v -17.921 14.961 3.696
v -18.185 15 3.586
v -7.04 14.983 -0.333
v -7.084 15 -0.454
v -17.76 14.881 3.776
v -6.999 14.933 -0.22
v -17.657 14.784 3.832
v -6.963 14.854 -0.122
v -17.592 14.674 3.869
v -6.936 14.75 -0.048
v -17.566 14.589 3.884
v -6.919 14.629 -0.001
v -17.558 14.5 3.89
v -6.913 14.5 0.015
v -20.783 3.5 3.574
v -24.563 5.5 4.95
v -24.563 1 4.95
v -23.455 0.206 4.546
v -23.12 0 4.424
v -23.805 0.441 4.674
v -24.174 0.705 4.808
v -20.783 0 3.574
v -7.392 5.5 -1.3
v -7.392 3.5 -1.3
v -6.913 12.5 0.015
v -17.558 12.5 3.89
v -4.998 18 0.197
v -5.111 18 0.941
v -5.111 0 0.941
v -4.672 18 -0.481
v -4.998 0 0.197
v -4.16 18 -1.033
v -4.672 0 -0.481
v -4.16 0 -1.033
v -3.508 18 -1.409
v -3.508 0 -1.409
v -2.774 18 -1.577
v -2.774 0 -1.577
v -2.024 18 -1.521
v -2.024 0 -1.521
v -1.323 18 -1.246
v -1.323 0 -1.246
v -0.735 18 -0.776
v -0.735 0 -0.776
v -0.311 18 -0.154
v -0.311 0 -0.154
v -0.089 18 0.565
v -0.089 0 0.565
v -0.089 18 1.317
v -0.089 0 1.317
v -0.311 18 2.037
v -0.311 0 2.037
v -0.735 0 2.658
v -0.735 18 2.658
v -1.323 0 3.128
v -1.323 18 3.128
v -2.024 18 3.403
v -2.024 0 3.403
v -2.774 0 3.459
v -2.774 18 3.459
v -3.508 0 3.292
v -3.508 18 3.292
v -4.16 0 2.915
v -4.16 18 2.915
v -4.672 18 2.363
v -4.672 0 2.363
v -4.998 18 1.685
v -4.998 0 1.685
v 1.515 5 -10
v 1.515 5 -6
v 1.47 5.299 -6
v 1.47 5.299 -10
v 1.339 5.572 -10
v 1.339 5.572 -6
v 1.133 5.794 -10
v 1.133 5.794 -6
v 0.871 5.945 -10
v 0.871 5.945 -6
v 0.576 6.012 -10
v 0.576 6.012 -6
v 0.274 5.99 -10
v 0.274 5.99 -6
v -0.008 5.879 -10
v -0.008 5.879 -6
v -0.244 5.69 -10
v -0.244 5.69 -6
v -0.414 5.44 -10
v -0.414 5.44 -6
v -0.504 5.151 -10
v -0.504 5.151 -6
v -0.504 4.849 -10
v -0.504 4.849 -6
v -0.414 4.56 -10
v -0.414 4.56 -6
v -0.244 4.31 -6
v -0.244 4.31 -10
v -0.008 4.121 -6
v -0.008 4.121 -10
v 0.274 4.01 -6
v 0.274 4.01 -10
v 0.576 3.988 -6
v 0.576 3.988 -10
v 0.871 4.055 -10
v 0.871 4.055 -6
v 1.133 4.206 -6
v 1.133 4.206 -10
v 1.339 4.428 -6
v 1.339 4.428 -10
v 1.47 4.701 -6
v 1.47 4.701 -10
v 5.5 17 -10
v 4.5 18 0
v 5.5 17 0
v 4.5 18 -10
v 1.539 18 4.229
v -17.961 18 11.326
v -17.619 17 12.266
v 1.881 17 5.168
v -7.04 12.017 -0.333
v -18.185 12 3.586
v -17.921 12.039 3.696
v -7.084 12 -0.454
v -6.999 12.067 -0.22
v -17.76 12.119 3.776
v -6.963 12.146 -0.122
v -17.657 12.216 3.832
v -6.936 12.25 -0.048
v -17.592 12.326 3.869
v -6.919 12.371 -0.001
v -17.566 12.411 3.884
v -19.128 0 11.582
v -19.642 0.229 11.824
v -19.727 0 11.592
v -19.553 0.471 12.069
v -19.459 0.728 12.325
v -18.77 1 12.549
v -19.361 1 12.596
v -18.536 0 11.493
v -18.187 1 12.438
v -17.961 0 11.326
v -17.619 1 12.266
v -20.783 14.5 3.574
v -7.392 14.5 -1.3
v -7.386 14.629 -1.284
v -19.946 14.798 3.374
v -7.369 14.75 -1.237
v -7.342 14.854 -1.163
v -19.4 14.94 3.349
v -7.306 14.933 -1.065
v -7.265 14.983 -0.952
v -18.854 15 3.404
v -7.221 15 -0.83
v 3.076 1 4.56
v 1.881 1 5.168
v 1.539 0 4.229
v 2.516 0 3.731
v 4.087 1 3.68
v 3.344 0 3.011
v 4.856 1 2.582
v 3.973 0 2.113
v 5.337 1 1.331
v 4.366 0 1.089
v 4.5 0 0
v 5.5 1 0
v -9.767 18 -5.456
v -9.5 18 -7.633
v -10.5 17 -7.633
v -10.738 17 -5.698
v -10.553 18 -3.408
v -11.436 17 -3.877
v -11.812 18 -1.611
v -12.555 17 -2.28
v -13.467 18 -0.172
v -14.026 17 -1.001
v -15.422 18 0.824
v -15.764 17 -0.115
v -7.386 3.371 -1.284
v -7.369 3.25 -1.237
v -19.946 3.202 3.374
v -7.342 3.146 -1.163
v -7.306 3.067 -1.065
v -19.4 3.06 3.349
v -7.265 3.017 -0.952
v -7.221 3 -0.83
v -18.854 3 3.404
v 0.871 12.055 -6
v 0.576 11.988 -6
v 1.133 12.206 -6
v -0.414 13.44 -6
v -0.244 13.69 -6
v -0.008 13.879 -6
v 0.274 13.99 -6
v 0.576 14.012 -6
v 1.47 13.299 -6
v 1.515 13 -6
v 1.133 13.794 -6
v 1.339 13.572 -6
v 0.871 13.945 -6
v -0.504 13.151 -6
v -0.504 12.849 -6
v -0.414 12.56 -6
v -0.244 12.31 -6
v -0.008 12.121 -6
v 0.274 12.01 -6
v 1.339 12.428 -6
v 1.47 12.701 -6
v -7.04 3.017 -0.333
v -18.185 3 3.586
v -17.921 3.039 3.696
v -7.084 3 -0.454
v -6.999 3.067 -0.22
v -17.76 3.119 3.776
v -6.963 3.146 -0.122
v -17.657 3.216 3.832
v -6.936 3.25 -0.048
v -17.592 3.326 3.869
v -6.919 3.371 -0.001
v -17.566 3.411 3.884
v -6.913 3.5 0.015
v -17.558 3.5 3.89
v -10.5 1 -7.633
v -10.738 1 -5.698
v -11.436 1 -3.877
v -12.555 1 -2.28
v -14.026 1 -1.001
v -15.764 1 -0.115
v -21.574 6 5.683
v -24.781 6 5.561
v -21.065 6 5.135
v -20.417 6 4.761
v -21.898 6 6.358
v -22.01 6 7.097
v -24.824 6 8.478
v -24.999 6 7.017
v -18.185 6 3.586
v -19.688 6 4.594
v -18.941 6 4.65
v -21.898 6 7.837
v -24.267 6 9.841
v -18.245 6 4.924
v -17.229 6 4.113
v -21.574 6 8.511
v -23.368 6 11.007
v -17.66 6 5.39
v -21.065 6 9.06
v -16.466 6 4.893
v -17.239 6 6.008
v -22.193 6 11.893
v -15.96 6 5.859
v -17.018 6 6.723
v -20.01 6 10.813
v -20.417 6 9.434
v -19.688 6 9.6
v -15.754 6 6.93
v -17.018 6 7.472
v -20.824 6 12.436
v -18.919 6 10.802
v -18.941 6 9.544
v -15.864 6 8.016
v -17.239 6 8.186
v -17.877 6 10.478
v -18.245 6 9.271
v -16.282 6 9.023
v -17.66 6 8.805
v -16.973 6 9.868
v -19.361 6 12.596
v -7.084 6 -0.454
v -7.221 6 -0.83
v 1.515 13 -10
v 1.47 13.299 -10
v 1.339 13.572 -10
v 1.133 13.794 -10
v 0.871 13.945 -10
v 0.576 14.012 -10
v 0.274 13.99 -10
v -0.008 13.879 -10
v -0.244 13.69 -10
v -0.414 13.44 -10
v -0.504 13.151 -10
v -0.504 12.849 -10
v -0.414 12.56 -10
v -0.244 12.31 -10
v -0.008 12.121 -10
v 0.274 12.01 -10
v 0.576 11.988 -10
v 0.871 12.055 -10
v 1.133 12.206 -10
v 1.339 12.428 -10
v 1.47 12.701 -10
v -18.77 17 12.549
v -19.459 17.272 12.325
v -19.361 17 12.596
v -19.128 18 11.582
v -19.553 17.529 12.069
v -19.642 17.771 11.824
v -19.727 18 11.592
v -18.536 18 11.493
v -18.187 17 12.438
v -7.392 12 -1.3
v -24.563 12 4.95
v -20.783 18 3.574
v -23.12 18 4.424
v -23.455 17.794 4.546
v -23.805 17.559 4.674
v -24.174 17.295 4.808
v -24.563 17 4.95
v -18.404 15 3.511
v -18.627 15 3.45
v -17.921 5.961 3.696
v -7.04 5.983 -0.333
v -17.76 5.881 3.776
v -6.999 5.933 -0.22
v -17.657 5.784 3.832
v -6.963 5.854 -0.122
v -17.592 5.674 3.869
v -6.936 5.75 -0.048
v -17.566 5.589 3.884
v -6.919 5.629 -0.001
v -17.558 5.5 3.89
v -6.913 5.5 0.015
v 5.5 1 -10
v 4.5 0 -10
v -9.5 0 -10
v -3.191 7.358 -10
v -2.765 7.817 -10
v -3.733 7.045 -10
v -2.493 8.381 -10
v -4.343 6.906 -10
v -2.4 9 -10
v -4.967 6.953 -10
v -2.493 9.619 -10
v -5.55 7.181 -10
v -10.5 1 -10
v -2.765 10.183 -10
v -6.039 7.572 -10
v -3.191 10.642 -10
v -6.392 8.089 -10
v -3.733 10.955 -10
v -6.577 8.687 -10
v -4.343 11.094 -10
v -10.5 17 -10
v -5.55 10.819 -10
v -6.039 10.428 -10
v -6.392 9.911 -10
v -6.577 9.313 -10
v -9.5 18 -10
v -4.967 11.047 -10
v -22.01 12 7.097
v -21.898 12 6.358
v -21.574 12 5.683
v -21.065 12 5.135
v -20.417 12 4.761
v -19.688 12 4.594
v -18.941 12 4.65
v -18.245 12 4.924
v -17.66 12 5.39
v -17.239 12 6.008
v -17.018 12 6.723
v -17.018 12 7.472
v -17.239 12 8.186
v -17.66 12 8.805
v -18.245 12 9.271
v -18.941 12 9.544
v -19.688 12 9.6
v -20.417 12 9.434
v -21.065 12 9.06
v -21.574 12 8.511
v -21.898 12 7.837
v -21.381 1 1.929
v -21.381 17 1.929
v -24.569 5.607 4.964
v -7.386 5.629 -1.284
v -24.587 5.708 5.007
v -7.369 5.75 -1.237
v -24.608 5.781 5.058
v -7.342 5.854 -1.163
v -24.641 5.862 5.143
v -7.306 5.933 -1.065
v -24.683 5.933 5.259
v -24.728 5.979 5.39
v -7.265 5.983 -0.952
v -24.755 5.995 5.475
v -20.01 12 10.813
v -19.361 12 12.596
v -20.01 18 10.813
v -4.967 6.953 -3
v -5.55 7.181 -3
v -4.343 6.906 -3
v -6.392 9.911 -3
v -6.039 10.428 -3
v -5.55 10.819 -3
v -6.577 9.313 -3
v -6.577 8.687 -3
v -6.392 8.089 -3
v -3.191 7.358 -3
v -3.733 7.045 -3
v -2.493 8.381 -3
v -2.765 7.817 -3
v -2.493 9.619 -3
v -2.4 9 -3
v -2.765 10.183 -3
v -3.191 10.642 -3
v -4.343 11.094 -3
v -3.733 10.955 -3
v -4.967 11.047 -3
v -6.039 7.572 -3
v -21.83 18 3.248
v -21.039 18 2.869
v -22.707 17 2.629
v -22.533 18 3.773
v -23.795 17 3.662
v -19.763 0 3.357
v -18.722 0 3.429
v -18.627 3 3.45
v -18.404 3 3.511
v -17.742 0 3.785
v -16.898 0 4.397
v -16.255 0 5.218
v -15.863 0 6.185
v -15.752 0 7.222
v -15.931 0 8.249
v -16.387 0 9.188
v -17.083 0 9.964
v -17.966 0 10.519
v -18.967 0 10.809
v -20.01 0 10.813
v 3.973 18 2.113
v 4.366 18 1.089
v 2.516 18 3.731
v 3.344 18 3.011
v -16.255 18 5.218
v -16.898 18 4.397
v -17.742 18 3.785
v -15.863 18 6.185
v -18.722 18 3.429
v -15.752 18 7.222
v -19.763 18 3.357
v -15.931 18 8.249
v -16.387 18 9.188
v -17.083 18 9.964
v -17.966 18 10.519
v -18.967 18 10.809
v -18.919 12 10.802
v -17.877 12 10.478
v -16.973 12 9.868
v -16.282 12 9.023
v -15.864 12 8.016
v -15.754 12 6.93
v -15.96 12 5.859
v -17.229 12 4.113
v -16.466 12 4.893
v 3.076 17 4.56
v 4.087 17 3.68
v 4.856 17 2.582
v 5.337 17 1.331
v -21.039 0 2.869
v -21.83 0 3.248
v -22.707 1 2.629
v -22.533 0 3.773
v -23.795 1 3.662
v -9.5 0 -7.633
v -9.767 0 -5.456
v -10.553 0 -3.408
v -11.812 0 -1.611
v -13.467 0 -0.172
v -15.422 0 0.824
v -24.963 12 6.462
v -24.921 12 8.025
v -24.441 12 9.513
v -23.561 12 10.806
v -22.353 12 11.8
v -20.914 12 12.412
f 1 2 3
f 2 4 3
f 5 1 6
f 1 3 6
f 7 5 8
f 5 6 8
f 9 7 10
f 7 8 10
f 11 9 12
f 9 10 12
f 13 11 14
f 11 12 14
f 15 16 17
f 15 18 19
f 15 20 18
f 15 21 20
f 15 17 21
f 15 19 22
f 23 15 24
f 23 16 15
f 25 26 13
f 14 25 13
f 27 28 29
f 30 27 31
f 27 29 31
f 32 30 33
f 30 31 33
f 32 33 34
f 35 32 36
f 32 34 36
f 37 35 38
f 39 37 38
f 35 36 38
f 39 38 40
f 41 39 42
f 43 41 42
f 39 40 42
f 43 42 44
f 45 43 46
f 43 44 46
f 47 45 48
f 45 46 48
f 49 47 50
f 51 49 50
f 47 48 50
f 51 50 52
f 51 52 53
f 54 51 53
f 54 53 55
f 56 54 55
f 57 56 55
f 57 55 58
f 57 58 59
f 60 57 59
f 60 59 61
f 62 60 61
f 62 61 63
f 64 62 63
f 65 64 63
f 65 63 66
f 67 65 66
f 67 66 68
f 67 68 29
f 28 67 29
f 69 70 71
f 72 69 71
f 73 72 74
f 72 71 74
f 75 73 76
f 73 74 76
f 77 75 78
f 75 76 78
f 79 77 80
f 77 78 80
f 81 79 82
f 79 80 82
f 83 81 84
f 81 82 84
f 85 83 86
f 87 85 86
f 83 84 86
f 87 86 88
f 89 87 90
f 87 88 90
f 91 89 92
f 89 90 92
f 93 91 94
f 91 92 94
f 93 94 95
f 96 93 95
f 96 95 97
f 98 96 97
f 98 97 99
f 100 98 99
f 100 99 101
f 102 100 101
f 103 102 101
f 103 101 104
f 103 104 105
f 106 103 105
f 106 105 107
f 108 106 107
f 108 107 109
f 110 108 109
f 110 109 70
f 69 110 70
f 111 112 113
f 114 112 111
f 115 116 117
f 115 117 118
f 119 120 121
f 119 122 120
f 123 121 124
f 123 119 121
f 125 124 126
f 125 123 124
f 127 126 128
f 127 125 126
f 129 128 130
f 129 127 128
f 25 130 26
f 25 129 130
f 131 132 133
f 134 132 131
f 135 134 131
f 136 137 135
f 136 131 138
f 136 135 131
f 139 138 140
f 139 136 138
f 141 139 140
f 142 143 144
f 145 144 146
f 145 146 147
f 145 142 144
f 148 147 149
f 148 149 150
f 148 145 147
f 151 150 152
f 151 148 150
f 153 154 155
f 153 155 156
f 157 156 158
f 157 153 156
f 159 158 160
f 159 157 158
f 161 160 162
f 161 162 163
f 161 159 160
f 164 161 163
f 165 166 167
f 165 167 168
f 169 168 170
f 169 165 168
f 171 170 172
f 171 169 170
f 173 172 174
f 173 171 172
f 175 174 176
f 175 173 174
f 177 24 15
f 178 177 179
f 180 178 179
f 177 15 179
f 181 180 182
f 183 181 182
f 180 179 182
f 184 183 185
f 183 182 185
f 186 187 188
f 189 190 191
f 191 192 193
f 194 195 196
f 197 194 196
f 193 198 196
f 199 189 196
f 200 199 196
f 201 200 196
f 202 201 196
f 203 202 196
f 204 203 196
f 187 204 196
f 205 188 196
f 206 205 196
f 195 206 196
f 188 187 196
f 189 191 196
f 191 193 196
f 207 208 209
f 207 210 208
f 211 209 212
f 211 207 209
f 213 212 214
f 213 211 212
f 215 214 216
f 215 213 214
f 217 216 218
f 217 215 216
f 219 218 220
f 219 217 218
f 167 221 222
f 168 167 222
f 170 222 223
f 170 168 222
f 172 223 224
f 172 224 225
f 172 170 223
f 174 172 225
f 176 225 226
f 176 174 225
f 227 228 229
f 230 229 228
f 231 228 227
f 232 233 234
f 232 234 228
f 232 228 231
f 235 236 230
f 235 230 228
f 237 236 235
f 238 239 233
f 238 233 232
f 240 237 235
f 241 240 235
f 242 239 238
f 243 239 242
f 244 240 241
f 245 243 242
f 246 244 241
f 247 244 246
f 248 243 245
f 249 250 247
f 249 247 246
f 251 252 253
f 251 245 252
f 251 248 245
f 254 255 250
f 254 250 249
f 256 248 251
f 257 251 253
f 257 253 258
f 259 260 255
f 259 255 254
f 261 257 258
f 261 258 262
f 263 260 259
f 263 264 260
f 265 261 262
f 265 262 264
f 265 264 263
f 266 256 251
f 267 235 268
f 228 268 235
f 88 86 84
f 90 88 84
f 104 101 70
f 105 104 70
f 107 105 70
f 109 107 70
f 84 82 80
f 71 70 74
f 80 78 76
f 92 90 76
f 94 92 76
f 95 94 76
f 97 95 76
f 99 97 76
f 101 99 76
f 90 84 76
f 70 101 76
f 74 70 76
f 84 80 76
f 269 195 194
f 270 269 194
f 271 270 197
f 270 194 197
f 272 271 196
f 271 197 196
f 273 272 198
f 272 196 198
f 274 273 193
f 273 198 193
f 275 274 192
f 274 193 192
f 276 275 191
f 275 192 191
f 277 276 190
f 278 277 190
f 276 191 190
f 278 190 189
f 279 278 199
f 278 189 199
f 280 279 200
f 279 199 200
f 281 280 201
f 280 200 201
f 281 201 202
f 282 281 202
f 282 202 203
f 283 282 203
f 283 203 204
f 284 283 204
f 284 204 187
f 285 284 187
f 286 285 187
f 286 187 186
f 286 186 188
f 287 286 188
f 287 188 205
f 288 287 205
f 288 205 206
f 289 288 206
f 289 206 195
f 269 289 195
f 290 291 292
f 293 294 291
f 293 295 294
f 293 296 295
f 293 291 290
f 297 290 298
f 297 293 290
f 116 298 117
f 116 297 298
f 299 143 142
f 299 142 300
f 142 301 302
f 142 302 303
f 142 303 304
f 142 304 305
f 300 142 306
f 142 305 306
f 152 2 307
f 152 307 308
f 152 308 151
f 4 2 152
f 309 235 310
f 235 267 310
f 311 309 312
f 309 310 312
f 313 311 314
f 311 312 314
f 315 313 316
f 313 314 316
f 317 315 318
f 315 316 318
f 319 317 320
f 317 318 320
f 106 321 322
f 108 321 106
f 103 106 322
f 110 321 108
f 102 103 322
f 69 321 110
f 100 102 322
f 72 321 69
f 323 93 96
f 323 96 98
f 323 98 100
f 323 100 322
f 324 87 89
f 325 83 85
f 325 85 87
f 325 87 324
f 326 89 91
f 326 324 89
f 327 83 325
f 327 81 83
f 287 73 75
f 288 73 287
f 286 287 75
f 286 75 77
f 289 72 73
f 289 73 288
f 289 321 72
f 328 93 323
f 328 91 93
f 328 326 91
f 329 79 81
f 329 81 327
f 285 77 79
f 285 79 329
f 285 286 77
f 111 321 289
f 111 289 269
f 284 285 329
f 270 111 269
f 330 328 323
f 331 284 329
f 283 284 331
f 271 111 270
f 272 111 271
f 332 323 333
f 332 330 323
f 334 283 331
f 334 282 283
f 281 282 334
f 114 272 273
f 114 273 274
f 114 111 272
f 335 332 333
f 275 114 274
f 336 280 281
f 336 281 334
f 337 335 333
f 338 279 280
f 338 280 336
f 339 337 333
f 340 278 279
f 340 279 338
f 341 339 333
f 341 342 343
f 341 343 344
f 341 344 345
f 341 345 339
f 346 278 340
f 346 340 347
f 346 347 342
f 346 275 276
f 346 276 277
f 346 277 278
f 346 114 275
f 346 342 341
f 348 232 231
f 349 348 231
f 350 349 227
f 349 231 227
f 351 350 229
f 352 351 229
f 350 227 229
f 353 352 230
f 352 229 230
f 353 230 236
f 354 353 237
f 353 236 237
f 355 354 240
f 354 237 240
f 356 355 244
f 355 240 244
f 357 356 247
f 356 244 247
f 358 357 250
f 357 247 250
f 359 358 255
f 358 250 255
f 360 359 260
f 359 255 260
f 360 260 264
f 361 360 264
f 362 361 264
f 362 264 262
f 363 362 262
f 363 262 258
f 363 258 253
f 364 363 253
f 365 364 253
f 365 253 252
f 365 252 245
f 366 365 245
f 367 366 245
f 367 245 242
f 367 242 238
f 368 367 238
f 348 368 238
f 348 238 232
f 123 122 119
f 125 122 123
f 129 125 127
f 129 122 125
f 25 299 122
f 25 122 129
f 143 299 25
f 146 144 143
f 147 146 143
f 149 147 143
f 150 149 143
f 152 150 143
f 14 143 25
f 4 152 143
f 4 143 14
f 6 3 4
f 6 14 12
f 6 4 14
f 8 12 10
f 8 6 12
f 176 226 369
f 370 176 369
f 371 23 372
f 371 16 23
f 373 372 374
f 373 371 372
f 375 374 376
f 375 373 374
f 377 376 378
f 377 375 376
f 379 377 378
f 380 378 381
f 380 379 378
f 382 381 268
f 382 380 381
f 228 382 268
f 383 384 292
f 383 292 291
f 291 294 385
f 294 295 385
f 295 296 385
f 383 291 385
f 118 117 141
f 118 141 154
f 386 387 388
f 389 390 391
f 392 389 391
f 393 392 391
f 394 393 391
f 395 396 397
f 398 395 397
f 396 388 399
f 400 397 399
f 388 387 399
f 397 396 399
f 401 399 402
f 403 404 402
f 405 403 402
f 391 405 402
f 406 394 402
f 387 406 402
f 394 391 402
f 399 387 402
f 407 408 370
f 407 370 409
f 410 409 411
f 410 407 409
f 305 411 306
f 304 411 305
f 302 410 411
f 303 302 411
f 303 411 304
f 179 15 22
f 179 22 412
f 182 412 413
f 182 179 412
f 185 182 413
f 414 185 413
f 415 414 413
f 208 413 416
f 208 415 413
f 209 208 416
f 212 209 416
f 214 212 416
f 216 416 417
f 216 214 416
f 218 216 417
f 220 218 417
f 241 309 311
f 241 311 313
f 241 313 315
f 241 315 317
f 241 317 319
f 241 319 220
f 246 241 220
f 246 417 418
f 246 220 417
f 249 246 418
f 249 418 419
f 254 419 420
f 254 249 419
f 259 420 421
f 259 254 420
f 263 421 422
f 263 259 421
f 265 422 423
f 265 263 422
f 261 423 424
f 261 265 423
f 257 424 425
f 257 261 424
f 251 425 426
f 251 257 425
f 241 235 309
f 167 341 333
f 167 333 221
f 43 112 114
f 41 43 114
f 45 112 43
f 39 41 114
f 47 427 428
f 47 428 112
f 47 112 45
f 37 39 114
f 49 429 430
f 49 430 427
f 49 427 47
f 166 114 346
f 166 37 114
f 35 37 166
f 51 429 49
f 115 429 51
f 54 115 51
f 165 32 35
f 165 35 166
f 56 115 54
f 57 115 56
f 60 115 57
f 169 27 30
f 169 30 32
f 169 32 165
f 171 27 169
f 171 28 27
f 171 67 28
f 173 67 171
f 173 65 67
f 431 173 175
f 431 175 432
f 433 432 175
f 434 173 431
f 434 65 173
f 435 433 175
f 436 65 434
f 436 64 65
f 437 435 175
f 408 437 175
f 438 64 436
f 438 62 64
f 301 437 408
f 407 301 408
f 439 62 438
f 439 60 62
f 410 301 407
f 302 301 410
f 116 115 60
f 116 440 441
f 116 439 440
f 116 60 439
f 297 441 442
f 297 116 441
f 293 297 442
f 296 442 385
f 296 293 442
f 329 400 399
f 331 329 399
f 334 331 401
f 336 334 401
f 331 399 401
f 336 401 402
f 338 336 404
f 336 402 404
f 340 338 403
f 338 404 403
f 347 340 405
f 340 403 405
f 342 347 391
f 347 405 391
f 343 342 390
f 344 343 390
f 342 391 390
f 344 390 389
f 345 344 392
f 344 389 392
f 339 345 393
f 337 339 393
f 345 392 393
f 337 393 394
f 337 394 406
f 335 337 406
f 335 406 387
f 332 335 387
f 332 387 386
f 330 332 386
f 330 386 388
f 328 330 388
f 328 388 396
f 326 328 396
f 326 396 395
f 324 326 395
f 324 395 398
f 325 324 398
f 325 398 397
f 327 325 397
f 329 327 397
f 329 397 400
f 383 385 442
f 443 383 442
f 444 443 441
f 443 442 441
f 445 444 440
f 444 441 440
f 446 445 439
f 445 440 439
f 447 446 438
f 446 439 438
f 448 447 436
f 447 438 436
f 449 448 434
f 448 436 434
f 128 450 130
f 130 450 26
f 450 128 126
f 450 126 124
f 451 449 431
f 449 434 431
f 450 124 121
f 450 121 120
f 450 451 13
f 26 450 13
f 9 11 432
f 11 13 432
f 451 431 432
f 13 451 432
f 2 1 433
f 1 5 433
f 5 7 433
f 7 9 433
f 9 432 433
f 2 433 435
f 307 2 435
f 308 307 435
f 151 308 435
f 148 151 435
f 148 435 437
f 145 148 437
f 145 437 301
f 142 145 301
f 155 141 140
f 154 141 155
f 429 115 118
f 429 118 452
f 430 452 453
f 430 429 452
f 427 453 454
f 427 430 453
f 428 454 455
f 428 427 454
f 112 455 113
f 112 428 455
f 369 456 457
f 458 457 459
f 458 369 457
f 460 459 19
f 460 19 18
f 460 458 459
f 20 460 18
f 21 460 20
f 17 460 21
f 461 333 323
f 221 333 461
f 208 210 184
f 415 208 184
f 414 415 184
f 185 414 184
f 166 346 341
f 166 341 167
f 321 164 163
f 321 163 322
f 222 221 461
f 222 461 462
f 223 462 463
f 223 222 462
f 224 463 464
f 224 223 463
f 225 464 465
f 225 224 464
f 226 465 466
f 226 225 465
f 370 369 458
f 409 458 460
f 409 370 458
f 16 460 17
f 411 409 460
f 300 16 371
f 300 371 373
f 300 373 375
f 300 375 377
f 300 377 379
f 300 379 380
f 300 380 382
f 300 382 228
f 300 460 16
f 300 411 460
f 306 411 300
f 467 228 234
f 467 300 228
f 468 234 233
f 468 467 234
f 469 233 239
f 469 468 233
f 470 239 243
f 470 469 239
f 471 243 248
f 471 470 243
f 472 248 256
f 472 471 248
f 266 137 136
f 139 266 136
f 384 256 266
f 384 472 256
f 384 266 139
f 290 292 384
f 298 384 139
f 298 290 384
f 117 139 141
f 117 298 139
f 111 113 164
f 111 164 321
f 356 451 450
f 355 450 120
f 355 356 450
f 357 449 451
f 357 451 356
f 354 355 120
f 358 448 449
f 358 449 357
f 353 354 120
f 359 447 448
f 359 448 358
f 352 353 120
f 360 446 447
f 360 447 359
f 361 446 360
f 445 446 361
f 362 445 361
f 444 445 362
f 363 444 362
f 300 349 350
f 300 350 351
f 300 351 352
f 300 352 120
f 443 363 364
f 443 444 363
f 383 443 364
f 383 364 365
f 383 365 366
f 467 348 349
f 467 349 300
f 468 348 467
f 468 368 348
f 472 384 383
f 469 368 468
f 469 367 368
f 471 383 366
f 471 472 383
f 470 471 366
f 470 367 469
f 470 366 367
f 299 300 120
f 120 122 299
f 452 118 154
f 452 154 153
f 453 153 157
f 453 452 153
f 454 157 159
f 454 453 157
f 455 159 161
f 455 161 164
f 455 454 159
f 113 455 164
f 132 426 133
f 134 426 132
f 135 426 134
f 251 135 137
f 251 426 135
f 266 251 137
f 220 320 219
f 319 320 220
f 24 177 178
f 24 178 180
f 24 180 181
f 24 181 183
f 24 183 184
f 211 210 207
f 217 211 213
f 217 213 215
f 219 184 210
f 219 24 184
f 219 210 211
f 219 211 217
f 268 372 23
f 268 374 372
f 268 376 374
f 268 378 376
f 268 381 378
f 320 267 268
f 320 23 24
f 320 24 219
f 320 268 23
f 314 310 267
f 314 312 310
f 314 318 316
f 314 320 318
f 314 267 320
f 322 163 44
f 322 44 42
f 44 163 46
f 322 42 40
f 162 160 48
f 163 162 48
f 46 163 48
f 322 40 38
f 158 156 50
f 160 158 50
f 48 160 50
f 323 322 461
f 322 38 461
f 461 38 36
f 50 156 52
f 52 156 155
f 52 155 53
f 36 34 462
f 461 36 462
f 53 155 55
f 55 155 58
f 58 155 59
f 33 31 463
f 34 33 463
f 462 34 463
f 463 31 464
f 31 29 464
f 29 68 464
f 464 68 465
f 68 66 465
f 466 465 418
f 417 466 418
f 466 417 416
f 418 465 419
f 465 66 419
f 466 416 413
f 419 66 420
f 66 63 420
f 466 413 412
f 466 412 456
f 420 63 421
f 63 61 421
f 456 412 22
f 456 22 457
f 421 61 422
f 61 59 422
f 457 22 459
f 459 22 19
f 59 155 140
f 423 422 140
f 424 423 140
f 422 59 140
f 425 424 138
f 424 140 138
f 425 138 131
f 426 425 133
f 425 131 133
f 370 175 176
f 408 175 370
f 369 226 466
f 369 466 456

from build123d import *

# Parameters (mm, degrees)
EXTRUDE_1_DEPTH     = 14.999999999999998
CUT_EXTRUDE_1_DEPTH = 32.759958749611776
CUT_EXTRUDE_2_DEPTH = 5.999999999999998
CUT_EXTRUDE_START   = -2.9999999999999996
CUT_EXTRUDE_3_DEPTH = 2.9999999999999996
CUT_EXTRUDE_START_2 = -3.0000000000000004
CUT_EXTRUDE_4_DEPTH = 3.0000000000000004
CUT_EXTRUDE_5_DEPTH = 10.50007039461797
CUT_EXTRUDE_6_DEPTH = 11.327672160759418
EXTRUDE_2_DEPTH     = 7.968709711177614
EXTRUDE_3_DEPTH     = 3.000000000000002
HOLE_WIZARD_1_D     = 4.2
HOLE_WIZARD_1_DEPTH = 7
HOLE_WIZARD_2_D     = 2.03
HOLE_WIZARD_2_DEPTH = 4
HOLE_WIZARD_3_D     = 2.03
HOLE_WIZARD_3_DEPTH = 4
HOLE_WIZARD_4_D     = 5.05
HOLE_WIZARD_5_D     = 5.02
HOLE_WIZARD_5_DEPTH = 12
FILLET_1_R          = 5.500000000000002
FILLET_2_R          = 8
CHAMFER_1_SIZE      = 0.9999999999999993
FILLET_3_R          = 0.5


with BuildPart() as part:
    # 草图1 → 凸台-拉伸1 (new body)
    with BuildSketch(Plane(origin=(0, 18, 0), x_dir=(1, 0, 0), z_dir=(0, 1, 0))):
        with BuildLine():
            Line((-17.618889211708797, -12.26572898251346), (21.661848401793918, 2.0312902888225244))
            Line((21.661848401793918, 2.0312902888225244), (-10.5, 2.0312902888223876))
            Line((-10.5, 2.0312902888223876), (-21.381110788291235, -1.9291101538684705))
            ThreePointArc((-21.381110788291235, -1.9291101538684705), (-24.668309414322497, -8.978530356482176), (-17.618889211708797, -12.26572898251346))
        make_face()
    extrude(amount=-EXTRUDE_1_DEPTH)

    # 草图2 → 切除-拉伸1 (cut, through all)
    with BuildSketch(Plane(origin=(0, 18, 0), x_dir=(-1, 0, 0), z_dir=(0, 1, 0))):
        Polygon((-21.66184840179392, -2.0312902888223894), (-5.5000000000000036, -2.0312902888223876), (-5.500000000000005, 3.8511414601534057), align=None)
    extrude(amount=-CUT_EXTRUDE_1_DEPTH, mode=Mode.SUBTRACT)

    # 草图3 → 切除-拉伸2 (cut)
    with BuildSketch(Plane(origin=(0, 18, 0), x_dir=(-1, 0, 0), z_dir=(0, 1, 0))):
        with BuildLine():
            Line((20.78257553747125, 3.5735722402438013), (24.563305918164147, 4.949645562601932))
            ThreePointArc((24.563305918164147, 4.949645562601932), (24.047293898775088, 10.191303567012326), (19.3611131717343, 12.59566569299606))
            Line((19.3611131717343, 12.59566569299606), (20.01010960022055, 10.812562660423456))
            ThreePointArc((20.01010960022055, 10.812562660423456), (15.771169677152303, 6.6995195513380725), (20.78257553747125, 3.5735722402438013))
        make_face()
    extrude(amount=-CUT_EXTRUDE_2_DEPTH, mode=Mode.SUBTRACT)

    # 草图4 → 切除-拉伸3 (cut)
    with BuildSketch(Plane.XZ.offset(-12).offset(CUT_EXTRUDE_START)):
        with BuildLine():
            Line((-20.78257553747125, 3.573572240243805), (-18.036485631419698, 2.5740772538221752))
            Line((-18.036485631419698, 2.5740772538221752), (-17.557657430763733, 3.889646922922488))
            ThreePointArc((-17.557657430763733, 3.889646922922488), (-19.134214632183554, 3.365302064053206), (-20.78257553747125, 3.573572240243805))
        make_face()
    extrude(amount=CUT_EXTRUDE_3_DEPTH, mode=Mode.SUBTRACT)

    # 草图5 → 切除-拉伸4 (cut)
    with BuildSketch(Plane.XZ.offset(-3.000000000000001).offset(CUT_EXTRUDE_START_2)):
        with BuildLine():
            Line((-17.258794358827192, 2.29102077914986), (-16.779966158171227, 3.606590448250214))
            Line((-16.779966158171227, 3.606590448250214), (-17.557657430763737, 3.8896469229224904))
            ThreePointArc((-17.557657430763737, 3.8896469229224904), (-15.965242102135065, 8.349612286378331), (-20.01010960022055, 10.81256266042346))
            Line((-20.01010960022055, 10.81256266042346), (-19.3611131717343, 12.59566569299606))
            ThreePointArc((-19.3611131717343, 12.59566569299606), (-24.04729389877508, 10.191303567012337), (-24.56330591816415, 4.94964556260195))
            Line((-24.56330591816415, 4.94964556260195), (-17.258794358827192, 2.29102077914986))
        make_face()
    extrude(amount=CUT_EXTRUDE_4_DEPTH, mode=Mode.SUBTRACT)

    # 草图6 → 切除-拉伸5 (cut)
    with BuildSketch(Plane(origin=(-15.97621882135595, 0, 5.8148681070970145), x_dir=(0.3420201433256677, 0, 0.9396926207859088), z_dir=(-0.9396926207859089, 0, 0.3420201433256677))):
        Polygon((-2.3499999999999055, 3), (-2.349999999999906, 6), (-3.7499999999999933, 6), (-3.749999999999994, 3), align=None)
    extrude(amount=-CUT_EXTRUDE_5_DEPTH, mode=Mode.SUBTRACT)

    # 草图7 → 切除-拉伸6 (cut)
    with BuildSketch(Plane(origin=(-16.753910093948367, 0, 6.097924581769449), x_dir=(0.3420201433256676, 0, 0.9396926207859088), z_dir=(-0.9396926207859088, 0, 0.3420201433256676))):
        Polygon((-3.749999999999993, 12), (-2.3499999999999055, 12), (-2.3499999999999055, 15), (-3.7499999999999933, 15), align=None)
    extrude(amount=-CUT_EXTRUDE_6_DEPTH, mode=Mode.SUBTRACT)

    # 草图8 → 凸台-拉伸2 (add)
    with BuildSketch(Plane(origin=(-8.63e-15, 0, -2.0312902888224325), x_dir=(-1, 0, 5e-17), z_dir=(-5e-17, 0, -1))):
        Polygon((-5.5, 3), (-5.500000000000001, 18), (10.5, 18), (10.5, 3), align=None)
    extrude(amount=EXTRUDE_2_DEPTH)

    # 草图9 → 凸台-拉伸3 (add)
    with BuildSketch(Plane.XZ.offset(-3.000000000000001)):
        with BuildLine():
            Line((-17.618889211708797, 12.26572898251346), (5.499999999999998, 3.8511414601533294))
            Line((5.499999999999998, 3.8511414601533294), (5.5, -10))
            Line((5.5, -10), (-10.5, -10.000000000000002))
            Line((-10.5, -10.000000000000002), (-10.500000000000014, -2.0312902888224262))
            Line((-10.500000000000014, -2.0312902888224262), (-21.381110788291203, 1.9291101538684652))
            ThreePointArc((-21.381110788291203, 1.9291101538684652), (-23.286441520356178, 3.1083268627098155), (-24.563305918164144, 4.94964556260193))
            Line((-24.563305918164144, 4.94964556260193), (-20.78257553747125, 3.573572240243805))
            ThreePointArc((-20.78257553747125, 3.573572240243805), (-15.771169677152304, 6.699519551338072), (-20.01010960022055, 10.81256266042346))
            Line((-20.01010960022055, 10.81256266042346), (-19.361113171734285, 12.595665692996059))
            ThreePointArc((-19.361113171734285, 12.595665692996059), (-18.476617299855562, 12.50137070130135), (-17.618889211708797, 12.26572898251346))
        make_face()
    extrude(amount=EXTRUDE_3_DEPTH)

    # 孔1
    with Locations(Plane(origin=(-5.4e-16, 0, -10.000000000000046), x_dir=(-1, 0, 5e-17), z_dir=(-5e-17, 0, -1))):
        with Locations((4.5, 9)):
            Hole(HOLE_WIZARD_1_D / 2, depth=HOLE_WIZARD_1_DEPTH)

    # 孔2
    with Locations(Plane(origin=(-5.4e-16, 0, -10.000000000000046), x_dir=(-1, 0, 5e-17), z_dir=(-5e-17, 0, -1))):
        with Locations((-0.5, 13)):
            Hole(HOLE_WIZARD_2_D / 2, depth=HOLE_WIZARD_2_DEPTH)

    # 孔3
    with Locations(Plane(origin=(-5.4e-16, 0, -10.000000000000046), x_dir=(-1, 0, 5e-17), z_dir=(-5e-17, 0, -1))):
        with Locations((-0.5, 5)):
            Hole(HOLE_WIZARD_3_D / 2, depth=HOLE_WIZARD_3_DEPTH)

    # 孔4 (through all)
    with Locations(Plane(origin=(0, 18, 0), x_dir=(1, 0, 0), z_dir=(0, 1, 0))):
        with Locations((-2.585532826, -0.941056988)):
            Hole(HOLE_WIZARD_4_D / 2)

    # 孔5
    with Locations(Plane(origin=(0, 12, 0), x_dir=(1, 0, 0), z_dir=(0, 1, 0))):
        with Locations((-19.5, -7.097419568)):
            Hole(HOLE_WIZARD_5_D / 2, depth=HOLE_WIZARD_5_DEPTH)

    # 圆角1
    fillet_1_edges = [part.edges().sort_by_distance(p)[0] for p in [
        (5.500000000000002, 8.999999999999998, 3.8511414601533676),
    ]]
    fillet(fillet_1_edges, radius=FILLET_1_R)

    # 圆角2
    fillet_2_edges = [part.edges().sort_by_distance(p)[0] for p in [
        (-10.50000000000001, 9, -2.031290288822418),
    ]]
    fillet(fillet_2_edges, radius=FILLET_2_R)

    # 倒角1
    chamfer_1_edges = [part.edges().sort_by_distance(p)[0] for p in [
        (-18.47661729985556, -1.33e-15, 12.50137070130135),
        (-23.286441520356178, -1.33e-15, 3.108326862709817),
        (-18.572474820842935, -1.33e-15, 0.9068502628278257),
        (5.499999999999999, -1.33e-15, -5.000000000000032),
        (-7.868889211708797, -1.33e-15, 8.717019198417944),
        (4.505336243589472, 17.999999999999986, 3.15467039993076),
        (4.505336243589466, -1.65e-14, 3.154670399930683),
        (-10.500000000000002, -1.33e-15, -8.816475297250042),
        (-18.57247482084295, 18, 0.9068502628278368),
        (-11.946783645688074, 17.999999999999993, -3.044339103691696),
        (-11.946783645688082, -7.42e-15, -3.0443391036917093),
        (5.4999999999999964, 18, -5.000000000000016),
        (-18.476617299855565, 18, 12.501370701301362),
        (-7.868889211708806, 18, 8.717019198417947),
        (-23.286441520356195, 18, 3.1083268627098226),
        (-10.500000000000009, 18, -8.816475297250054),
    ]]
    chamfer(chamfer_1_edges, length=CHAMFER_1_SIZE)

    # 圆角3
    fillet_3_edges = [part.edges().sort_by_distance(p)[0] for p in [
        (-14.087265614371681, 3.0000000000000004, 1.1366787190484136),
        (-14.087265614371635, 15, 1.1366787190484962),
        (-15.977630804718132, 6.000000000000001, 1.8247153802274876),
        (-12.23539246068994, 6.000000000000001, 1.9525008949379346),
        (-12.23539246068994, 3.0000000000000004, 1.9525008949379348),
        (-12.235392460689857, 15, 1.952500894938097),
        (-12.235392460689857, 12, 1.952500894938097),
    ]]
    fillet(fillet_3_edges, radius=FILLET_3_R)


solid = part.part
